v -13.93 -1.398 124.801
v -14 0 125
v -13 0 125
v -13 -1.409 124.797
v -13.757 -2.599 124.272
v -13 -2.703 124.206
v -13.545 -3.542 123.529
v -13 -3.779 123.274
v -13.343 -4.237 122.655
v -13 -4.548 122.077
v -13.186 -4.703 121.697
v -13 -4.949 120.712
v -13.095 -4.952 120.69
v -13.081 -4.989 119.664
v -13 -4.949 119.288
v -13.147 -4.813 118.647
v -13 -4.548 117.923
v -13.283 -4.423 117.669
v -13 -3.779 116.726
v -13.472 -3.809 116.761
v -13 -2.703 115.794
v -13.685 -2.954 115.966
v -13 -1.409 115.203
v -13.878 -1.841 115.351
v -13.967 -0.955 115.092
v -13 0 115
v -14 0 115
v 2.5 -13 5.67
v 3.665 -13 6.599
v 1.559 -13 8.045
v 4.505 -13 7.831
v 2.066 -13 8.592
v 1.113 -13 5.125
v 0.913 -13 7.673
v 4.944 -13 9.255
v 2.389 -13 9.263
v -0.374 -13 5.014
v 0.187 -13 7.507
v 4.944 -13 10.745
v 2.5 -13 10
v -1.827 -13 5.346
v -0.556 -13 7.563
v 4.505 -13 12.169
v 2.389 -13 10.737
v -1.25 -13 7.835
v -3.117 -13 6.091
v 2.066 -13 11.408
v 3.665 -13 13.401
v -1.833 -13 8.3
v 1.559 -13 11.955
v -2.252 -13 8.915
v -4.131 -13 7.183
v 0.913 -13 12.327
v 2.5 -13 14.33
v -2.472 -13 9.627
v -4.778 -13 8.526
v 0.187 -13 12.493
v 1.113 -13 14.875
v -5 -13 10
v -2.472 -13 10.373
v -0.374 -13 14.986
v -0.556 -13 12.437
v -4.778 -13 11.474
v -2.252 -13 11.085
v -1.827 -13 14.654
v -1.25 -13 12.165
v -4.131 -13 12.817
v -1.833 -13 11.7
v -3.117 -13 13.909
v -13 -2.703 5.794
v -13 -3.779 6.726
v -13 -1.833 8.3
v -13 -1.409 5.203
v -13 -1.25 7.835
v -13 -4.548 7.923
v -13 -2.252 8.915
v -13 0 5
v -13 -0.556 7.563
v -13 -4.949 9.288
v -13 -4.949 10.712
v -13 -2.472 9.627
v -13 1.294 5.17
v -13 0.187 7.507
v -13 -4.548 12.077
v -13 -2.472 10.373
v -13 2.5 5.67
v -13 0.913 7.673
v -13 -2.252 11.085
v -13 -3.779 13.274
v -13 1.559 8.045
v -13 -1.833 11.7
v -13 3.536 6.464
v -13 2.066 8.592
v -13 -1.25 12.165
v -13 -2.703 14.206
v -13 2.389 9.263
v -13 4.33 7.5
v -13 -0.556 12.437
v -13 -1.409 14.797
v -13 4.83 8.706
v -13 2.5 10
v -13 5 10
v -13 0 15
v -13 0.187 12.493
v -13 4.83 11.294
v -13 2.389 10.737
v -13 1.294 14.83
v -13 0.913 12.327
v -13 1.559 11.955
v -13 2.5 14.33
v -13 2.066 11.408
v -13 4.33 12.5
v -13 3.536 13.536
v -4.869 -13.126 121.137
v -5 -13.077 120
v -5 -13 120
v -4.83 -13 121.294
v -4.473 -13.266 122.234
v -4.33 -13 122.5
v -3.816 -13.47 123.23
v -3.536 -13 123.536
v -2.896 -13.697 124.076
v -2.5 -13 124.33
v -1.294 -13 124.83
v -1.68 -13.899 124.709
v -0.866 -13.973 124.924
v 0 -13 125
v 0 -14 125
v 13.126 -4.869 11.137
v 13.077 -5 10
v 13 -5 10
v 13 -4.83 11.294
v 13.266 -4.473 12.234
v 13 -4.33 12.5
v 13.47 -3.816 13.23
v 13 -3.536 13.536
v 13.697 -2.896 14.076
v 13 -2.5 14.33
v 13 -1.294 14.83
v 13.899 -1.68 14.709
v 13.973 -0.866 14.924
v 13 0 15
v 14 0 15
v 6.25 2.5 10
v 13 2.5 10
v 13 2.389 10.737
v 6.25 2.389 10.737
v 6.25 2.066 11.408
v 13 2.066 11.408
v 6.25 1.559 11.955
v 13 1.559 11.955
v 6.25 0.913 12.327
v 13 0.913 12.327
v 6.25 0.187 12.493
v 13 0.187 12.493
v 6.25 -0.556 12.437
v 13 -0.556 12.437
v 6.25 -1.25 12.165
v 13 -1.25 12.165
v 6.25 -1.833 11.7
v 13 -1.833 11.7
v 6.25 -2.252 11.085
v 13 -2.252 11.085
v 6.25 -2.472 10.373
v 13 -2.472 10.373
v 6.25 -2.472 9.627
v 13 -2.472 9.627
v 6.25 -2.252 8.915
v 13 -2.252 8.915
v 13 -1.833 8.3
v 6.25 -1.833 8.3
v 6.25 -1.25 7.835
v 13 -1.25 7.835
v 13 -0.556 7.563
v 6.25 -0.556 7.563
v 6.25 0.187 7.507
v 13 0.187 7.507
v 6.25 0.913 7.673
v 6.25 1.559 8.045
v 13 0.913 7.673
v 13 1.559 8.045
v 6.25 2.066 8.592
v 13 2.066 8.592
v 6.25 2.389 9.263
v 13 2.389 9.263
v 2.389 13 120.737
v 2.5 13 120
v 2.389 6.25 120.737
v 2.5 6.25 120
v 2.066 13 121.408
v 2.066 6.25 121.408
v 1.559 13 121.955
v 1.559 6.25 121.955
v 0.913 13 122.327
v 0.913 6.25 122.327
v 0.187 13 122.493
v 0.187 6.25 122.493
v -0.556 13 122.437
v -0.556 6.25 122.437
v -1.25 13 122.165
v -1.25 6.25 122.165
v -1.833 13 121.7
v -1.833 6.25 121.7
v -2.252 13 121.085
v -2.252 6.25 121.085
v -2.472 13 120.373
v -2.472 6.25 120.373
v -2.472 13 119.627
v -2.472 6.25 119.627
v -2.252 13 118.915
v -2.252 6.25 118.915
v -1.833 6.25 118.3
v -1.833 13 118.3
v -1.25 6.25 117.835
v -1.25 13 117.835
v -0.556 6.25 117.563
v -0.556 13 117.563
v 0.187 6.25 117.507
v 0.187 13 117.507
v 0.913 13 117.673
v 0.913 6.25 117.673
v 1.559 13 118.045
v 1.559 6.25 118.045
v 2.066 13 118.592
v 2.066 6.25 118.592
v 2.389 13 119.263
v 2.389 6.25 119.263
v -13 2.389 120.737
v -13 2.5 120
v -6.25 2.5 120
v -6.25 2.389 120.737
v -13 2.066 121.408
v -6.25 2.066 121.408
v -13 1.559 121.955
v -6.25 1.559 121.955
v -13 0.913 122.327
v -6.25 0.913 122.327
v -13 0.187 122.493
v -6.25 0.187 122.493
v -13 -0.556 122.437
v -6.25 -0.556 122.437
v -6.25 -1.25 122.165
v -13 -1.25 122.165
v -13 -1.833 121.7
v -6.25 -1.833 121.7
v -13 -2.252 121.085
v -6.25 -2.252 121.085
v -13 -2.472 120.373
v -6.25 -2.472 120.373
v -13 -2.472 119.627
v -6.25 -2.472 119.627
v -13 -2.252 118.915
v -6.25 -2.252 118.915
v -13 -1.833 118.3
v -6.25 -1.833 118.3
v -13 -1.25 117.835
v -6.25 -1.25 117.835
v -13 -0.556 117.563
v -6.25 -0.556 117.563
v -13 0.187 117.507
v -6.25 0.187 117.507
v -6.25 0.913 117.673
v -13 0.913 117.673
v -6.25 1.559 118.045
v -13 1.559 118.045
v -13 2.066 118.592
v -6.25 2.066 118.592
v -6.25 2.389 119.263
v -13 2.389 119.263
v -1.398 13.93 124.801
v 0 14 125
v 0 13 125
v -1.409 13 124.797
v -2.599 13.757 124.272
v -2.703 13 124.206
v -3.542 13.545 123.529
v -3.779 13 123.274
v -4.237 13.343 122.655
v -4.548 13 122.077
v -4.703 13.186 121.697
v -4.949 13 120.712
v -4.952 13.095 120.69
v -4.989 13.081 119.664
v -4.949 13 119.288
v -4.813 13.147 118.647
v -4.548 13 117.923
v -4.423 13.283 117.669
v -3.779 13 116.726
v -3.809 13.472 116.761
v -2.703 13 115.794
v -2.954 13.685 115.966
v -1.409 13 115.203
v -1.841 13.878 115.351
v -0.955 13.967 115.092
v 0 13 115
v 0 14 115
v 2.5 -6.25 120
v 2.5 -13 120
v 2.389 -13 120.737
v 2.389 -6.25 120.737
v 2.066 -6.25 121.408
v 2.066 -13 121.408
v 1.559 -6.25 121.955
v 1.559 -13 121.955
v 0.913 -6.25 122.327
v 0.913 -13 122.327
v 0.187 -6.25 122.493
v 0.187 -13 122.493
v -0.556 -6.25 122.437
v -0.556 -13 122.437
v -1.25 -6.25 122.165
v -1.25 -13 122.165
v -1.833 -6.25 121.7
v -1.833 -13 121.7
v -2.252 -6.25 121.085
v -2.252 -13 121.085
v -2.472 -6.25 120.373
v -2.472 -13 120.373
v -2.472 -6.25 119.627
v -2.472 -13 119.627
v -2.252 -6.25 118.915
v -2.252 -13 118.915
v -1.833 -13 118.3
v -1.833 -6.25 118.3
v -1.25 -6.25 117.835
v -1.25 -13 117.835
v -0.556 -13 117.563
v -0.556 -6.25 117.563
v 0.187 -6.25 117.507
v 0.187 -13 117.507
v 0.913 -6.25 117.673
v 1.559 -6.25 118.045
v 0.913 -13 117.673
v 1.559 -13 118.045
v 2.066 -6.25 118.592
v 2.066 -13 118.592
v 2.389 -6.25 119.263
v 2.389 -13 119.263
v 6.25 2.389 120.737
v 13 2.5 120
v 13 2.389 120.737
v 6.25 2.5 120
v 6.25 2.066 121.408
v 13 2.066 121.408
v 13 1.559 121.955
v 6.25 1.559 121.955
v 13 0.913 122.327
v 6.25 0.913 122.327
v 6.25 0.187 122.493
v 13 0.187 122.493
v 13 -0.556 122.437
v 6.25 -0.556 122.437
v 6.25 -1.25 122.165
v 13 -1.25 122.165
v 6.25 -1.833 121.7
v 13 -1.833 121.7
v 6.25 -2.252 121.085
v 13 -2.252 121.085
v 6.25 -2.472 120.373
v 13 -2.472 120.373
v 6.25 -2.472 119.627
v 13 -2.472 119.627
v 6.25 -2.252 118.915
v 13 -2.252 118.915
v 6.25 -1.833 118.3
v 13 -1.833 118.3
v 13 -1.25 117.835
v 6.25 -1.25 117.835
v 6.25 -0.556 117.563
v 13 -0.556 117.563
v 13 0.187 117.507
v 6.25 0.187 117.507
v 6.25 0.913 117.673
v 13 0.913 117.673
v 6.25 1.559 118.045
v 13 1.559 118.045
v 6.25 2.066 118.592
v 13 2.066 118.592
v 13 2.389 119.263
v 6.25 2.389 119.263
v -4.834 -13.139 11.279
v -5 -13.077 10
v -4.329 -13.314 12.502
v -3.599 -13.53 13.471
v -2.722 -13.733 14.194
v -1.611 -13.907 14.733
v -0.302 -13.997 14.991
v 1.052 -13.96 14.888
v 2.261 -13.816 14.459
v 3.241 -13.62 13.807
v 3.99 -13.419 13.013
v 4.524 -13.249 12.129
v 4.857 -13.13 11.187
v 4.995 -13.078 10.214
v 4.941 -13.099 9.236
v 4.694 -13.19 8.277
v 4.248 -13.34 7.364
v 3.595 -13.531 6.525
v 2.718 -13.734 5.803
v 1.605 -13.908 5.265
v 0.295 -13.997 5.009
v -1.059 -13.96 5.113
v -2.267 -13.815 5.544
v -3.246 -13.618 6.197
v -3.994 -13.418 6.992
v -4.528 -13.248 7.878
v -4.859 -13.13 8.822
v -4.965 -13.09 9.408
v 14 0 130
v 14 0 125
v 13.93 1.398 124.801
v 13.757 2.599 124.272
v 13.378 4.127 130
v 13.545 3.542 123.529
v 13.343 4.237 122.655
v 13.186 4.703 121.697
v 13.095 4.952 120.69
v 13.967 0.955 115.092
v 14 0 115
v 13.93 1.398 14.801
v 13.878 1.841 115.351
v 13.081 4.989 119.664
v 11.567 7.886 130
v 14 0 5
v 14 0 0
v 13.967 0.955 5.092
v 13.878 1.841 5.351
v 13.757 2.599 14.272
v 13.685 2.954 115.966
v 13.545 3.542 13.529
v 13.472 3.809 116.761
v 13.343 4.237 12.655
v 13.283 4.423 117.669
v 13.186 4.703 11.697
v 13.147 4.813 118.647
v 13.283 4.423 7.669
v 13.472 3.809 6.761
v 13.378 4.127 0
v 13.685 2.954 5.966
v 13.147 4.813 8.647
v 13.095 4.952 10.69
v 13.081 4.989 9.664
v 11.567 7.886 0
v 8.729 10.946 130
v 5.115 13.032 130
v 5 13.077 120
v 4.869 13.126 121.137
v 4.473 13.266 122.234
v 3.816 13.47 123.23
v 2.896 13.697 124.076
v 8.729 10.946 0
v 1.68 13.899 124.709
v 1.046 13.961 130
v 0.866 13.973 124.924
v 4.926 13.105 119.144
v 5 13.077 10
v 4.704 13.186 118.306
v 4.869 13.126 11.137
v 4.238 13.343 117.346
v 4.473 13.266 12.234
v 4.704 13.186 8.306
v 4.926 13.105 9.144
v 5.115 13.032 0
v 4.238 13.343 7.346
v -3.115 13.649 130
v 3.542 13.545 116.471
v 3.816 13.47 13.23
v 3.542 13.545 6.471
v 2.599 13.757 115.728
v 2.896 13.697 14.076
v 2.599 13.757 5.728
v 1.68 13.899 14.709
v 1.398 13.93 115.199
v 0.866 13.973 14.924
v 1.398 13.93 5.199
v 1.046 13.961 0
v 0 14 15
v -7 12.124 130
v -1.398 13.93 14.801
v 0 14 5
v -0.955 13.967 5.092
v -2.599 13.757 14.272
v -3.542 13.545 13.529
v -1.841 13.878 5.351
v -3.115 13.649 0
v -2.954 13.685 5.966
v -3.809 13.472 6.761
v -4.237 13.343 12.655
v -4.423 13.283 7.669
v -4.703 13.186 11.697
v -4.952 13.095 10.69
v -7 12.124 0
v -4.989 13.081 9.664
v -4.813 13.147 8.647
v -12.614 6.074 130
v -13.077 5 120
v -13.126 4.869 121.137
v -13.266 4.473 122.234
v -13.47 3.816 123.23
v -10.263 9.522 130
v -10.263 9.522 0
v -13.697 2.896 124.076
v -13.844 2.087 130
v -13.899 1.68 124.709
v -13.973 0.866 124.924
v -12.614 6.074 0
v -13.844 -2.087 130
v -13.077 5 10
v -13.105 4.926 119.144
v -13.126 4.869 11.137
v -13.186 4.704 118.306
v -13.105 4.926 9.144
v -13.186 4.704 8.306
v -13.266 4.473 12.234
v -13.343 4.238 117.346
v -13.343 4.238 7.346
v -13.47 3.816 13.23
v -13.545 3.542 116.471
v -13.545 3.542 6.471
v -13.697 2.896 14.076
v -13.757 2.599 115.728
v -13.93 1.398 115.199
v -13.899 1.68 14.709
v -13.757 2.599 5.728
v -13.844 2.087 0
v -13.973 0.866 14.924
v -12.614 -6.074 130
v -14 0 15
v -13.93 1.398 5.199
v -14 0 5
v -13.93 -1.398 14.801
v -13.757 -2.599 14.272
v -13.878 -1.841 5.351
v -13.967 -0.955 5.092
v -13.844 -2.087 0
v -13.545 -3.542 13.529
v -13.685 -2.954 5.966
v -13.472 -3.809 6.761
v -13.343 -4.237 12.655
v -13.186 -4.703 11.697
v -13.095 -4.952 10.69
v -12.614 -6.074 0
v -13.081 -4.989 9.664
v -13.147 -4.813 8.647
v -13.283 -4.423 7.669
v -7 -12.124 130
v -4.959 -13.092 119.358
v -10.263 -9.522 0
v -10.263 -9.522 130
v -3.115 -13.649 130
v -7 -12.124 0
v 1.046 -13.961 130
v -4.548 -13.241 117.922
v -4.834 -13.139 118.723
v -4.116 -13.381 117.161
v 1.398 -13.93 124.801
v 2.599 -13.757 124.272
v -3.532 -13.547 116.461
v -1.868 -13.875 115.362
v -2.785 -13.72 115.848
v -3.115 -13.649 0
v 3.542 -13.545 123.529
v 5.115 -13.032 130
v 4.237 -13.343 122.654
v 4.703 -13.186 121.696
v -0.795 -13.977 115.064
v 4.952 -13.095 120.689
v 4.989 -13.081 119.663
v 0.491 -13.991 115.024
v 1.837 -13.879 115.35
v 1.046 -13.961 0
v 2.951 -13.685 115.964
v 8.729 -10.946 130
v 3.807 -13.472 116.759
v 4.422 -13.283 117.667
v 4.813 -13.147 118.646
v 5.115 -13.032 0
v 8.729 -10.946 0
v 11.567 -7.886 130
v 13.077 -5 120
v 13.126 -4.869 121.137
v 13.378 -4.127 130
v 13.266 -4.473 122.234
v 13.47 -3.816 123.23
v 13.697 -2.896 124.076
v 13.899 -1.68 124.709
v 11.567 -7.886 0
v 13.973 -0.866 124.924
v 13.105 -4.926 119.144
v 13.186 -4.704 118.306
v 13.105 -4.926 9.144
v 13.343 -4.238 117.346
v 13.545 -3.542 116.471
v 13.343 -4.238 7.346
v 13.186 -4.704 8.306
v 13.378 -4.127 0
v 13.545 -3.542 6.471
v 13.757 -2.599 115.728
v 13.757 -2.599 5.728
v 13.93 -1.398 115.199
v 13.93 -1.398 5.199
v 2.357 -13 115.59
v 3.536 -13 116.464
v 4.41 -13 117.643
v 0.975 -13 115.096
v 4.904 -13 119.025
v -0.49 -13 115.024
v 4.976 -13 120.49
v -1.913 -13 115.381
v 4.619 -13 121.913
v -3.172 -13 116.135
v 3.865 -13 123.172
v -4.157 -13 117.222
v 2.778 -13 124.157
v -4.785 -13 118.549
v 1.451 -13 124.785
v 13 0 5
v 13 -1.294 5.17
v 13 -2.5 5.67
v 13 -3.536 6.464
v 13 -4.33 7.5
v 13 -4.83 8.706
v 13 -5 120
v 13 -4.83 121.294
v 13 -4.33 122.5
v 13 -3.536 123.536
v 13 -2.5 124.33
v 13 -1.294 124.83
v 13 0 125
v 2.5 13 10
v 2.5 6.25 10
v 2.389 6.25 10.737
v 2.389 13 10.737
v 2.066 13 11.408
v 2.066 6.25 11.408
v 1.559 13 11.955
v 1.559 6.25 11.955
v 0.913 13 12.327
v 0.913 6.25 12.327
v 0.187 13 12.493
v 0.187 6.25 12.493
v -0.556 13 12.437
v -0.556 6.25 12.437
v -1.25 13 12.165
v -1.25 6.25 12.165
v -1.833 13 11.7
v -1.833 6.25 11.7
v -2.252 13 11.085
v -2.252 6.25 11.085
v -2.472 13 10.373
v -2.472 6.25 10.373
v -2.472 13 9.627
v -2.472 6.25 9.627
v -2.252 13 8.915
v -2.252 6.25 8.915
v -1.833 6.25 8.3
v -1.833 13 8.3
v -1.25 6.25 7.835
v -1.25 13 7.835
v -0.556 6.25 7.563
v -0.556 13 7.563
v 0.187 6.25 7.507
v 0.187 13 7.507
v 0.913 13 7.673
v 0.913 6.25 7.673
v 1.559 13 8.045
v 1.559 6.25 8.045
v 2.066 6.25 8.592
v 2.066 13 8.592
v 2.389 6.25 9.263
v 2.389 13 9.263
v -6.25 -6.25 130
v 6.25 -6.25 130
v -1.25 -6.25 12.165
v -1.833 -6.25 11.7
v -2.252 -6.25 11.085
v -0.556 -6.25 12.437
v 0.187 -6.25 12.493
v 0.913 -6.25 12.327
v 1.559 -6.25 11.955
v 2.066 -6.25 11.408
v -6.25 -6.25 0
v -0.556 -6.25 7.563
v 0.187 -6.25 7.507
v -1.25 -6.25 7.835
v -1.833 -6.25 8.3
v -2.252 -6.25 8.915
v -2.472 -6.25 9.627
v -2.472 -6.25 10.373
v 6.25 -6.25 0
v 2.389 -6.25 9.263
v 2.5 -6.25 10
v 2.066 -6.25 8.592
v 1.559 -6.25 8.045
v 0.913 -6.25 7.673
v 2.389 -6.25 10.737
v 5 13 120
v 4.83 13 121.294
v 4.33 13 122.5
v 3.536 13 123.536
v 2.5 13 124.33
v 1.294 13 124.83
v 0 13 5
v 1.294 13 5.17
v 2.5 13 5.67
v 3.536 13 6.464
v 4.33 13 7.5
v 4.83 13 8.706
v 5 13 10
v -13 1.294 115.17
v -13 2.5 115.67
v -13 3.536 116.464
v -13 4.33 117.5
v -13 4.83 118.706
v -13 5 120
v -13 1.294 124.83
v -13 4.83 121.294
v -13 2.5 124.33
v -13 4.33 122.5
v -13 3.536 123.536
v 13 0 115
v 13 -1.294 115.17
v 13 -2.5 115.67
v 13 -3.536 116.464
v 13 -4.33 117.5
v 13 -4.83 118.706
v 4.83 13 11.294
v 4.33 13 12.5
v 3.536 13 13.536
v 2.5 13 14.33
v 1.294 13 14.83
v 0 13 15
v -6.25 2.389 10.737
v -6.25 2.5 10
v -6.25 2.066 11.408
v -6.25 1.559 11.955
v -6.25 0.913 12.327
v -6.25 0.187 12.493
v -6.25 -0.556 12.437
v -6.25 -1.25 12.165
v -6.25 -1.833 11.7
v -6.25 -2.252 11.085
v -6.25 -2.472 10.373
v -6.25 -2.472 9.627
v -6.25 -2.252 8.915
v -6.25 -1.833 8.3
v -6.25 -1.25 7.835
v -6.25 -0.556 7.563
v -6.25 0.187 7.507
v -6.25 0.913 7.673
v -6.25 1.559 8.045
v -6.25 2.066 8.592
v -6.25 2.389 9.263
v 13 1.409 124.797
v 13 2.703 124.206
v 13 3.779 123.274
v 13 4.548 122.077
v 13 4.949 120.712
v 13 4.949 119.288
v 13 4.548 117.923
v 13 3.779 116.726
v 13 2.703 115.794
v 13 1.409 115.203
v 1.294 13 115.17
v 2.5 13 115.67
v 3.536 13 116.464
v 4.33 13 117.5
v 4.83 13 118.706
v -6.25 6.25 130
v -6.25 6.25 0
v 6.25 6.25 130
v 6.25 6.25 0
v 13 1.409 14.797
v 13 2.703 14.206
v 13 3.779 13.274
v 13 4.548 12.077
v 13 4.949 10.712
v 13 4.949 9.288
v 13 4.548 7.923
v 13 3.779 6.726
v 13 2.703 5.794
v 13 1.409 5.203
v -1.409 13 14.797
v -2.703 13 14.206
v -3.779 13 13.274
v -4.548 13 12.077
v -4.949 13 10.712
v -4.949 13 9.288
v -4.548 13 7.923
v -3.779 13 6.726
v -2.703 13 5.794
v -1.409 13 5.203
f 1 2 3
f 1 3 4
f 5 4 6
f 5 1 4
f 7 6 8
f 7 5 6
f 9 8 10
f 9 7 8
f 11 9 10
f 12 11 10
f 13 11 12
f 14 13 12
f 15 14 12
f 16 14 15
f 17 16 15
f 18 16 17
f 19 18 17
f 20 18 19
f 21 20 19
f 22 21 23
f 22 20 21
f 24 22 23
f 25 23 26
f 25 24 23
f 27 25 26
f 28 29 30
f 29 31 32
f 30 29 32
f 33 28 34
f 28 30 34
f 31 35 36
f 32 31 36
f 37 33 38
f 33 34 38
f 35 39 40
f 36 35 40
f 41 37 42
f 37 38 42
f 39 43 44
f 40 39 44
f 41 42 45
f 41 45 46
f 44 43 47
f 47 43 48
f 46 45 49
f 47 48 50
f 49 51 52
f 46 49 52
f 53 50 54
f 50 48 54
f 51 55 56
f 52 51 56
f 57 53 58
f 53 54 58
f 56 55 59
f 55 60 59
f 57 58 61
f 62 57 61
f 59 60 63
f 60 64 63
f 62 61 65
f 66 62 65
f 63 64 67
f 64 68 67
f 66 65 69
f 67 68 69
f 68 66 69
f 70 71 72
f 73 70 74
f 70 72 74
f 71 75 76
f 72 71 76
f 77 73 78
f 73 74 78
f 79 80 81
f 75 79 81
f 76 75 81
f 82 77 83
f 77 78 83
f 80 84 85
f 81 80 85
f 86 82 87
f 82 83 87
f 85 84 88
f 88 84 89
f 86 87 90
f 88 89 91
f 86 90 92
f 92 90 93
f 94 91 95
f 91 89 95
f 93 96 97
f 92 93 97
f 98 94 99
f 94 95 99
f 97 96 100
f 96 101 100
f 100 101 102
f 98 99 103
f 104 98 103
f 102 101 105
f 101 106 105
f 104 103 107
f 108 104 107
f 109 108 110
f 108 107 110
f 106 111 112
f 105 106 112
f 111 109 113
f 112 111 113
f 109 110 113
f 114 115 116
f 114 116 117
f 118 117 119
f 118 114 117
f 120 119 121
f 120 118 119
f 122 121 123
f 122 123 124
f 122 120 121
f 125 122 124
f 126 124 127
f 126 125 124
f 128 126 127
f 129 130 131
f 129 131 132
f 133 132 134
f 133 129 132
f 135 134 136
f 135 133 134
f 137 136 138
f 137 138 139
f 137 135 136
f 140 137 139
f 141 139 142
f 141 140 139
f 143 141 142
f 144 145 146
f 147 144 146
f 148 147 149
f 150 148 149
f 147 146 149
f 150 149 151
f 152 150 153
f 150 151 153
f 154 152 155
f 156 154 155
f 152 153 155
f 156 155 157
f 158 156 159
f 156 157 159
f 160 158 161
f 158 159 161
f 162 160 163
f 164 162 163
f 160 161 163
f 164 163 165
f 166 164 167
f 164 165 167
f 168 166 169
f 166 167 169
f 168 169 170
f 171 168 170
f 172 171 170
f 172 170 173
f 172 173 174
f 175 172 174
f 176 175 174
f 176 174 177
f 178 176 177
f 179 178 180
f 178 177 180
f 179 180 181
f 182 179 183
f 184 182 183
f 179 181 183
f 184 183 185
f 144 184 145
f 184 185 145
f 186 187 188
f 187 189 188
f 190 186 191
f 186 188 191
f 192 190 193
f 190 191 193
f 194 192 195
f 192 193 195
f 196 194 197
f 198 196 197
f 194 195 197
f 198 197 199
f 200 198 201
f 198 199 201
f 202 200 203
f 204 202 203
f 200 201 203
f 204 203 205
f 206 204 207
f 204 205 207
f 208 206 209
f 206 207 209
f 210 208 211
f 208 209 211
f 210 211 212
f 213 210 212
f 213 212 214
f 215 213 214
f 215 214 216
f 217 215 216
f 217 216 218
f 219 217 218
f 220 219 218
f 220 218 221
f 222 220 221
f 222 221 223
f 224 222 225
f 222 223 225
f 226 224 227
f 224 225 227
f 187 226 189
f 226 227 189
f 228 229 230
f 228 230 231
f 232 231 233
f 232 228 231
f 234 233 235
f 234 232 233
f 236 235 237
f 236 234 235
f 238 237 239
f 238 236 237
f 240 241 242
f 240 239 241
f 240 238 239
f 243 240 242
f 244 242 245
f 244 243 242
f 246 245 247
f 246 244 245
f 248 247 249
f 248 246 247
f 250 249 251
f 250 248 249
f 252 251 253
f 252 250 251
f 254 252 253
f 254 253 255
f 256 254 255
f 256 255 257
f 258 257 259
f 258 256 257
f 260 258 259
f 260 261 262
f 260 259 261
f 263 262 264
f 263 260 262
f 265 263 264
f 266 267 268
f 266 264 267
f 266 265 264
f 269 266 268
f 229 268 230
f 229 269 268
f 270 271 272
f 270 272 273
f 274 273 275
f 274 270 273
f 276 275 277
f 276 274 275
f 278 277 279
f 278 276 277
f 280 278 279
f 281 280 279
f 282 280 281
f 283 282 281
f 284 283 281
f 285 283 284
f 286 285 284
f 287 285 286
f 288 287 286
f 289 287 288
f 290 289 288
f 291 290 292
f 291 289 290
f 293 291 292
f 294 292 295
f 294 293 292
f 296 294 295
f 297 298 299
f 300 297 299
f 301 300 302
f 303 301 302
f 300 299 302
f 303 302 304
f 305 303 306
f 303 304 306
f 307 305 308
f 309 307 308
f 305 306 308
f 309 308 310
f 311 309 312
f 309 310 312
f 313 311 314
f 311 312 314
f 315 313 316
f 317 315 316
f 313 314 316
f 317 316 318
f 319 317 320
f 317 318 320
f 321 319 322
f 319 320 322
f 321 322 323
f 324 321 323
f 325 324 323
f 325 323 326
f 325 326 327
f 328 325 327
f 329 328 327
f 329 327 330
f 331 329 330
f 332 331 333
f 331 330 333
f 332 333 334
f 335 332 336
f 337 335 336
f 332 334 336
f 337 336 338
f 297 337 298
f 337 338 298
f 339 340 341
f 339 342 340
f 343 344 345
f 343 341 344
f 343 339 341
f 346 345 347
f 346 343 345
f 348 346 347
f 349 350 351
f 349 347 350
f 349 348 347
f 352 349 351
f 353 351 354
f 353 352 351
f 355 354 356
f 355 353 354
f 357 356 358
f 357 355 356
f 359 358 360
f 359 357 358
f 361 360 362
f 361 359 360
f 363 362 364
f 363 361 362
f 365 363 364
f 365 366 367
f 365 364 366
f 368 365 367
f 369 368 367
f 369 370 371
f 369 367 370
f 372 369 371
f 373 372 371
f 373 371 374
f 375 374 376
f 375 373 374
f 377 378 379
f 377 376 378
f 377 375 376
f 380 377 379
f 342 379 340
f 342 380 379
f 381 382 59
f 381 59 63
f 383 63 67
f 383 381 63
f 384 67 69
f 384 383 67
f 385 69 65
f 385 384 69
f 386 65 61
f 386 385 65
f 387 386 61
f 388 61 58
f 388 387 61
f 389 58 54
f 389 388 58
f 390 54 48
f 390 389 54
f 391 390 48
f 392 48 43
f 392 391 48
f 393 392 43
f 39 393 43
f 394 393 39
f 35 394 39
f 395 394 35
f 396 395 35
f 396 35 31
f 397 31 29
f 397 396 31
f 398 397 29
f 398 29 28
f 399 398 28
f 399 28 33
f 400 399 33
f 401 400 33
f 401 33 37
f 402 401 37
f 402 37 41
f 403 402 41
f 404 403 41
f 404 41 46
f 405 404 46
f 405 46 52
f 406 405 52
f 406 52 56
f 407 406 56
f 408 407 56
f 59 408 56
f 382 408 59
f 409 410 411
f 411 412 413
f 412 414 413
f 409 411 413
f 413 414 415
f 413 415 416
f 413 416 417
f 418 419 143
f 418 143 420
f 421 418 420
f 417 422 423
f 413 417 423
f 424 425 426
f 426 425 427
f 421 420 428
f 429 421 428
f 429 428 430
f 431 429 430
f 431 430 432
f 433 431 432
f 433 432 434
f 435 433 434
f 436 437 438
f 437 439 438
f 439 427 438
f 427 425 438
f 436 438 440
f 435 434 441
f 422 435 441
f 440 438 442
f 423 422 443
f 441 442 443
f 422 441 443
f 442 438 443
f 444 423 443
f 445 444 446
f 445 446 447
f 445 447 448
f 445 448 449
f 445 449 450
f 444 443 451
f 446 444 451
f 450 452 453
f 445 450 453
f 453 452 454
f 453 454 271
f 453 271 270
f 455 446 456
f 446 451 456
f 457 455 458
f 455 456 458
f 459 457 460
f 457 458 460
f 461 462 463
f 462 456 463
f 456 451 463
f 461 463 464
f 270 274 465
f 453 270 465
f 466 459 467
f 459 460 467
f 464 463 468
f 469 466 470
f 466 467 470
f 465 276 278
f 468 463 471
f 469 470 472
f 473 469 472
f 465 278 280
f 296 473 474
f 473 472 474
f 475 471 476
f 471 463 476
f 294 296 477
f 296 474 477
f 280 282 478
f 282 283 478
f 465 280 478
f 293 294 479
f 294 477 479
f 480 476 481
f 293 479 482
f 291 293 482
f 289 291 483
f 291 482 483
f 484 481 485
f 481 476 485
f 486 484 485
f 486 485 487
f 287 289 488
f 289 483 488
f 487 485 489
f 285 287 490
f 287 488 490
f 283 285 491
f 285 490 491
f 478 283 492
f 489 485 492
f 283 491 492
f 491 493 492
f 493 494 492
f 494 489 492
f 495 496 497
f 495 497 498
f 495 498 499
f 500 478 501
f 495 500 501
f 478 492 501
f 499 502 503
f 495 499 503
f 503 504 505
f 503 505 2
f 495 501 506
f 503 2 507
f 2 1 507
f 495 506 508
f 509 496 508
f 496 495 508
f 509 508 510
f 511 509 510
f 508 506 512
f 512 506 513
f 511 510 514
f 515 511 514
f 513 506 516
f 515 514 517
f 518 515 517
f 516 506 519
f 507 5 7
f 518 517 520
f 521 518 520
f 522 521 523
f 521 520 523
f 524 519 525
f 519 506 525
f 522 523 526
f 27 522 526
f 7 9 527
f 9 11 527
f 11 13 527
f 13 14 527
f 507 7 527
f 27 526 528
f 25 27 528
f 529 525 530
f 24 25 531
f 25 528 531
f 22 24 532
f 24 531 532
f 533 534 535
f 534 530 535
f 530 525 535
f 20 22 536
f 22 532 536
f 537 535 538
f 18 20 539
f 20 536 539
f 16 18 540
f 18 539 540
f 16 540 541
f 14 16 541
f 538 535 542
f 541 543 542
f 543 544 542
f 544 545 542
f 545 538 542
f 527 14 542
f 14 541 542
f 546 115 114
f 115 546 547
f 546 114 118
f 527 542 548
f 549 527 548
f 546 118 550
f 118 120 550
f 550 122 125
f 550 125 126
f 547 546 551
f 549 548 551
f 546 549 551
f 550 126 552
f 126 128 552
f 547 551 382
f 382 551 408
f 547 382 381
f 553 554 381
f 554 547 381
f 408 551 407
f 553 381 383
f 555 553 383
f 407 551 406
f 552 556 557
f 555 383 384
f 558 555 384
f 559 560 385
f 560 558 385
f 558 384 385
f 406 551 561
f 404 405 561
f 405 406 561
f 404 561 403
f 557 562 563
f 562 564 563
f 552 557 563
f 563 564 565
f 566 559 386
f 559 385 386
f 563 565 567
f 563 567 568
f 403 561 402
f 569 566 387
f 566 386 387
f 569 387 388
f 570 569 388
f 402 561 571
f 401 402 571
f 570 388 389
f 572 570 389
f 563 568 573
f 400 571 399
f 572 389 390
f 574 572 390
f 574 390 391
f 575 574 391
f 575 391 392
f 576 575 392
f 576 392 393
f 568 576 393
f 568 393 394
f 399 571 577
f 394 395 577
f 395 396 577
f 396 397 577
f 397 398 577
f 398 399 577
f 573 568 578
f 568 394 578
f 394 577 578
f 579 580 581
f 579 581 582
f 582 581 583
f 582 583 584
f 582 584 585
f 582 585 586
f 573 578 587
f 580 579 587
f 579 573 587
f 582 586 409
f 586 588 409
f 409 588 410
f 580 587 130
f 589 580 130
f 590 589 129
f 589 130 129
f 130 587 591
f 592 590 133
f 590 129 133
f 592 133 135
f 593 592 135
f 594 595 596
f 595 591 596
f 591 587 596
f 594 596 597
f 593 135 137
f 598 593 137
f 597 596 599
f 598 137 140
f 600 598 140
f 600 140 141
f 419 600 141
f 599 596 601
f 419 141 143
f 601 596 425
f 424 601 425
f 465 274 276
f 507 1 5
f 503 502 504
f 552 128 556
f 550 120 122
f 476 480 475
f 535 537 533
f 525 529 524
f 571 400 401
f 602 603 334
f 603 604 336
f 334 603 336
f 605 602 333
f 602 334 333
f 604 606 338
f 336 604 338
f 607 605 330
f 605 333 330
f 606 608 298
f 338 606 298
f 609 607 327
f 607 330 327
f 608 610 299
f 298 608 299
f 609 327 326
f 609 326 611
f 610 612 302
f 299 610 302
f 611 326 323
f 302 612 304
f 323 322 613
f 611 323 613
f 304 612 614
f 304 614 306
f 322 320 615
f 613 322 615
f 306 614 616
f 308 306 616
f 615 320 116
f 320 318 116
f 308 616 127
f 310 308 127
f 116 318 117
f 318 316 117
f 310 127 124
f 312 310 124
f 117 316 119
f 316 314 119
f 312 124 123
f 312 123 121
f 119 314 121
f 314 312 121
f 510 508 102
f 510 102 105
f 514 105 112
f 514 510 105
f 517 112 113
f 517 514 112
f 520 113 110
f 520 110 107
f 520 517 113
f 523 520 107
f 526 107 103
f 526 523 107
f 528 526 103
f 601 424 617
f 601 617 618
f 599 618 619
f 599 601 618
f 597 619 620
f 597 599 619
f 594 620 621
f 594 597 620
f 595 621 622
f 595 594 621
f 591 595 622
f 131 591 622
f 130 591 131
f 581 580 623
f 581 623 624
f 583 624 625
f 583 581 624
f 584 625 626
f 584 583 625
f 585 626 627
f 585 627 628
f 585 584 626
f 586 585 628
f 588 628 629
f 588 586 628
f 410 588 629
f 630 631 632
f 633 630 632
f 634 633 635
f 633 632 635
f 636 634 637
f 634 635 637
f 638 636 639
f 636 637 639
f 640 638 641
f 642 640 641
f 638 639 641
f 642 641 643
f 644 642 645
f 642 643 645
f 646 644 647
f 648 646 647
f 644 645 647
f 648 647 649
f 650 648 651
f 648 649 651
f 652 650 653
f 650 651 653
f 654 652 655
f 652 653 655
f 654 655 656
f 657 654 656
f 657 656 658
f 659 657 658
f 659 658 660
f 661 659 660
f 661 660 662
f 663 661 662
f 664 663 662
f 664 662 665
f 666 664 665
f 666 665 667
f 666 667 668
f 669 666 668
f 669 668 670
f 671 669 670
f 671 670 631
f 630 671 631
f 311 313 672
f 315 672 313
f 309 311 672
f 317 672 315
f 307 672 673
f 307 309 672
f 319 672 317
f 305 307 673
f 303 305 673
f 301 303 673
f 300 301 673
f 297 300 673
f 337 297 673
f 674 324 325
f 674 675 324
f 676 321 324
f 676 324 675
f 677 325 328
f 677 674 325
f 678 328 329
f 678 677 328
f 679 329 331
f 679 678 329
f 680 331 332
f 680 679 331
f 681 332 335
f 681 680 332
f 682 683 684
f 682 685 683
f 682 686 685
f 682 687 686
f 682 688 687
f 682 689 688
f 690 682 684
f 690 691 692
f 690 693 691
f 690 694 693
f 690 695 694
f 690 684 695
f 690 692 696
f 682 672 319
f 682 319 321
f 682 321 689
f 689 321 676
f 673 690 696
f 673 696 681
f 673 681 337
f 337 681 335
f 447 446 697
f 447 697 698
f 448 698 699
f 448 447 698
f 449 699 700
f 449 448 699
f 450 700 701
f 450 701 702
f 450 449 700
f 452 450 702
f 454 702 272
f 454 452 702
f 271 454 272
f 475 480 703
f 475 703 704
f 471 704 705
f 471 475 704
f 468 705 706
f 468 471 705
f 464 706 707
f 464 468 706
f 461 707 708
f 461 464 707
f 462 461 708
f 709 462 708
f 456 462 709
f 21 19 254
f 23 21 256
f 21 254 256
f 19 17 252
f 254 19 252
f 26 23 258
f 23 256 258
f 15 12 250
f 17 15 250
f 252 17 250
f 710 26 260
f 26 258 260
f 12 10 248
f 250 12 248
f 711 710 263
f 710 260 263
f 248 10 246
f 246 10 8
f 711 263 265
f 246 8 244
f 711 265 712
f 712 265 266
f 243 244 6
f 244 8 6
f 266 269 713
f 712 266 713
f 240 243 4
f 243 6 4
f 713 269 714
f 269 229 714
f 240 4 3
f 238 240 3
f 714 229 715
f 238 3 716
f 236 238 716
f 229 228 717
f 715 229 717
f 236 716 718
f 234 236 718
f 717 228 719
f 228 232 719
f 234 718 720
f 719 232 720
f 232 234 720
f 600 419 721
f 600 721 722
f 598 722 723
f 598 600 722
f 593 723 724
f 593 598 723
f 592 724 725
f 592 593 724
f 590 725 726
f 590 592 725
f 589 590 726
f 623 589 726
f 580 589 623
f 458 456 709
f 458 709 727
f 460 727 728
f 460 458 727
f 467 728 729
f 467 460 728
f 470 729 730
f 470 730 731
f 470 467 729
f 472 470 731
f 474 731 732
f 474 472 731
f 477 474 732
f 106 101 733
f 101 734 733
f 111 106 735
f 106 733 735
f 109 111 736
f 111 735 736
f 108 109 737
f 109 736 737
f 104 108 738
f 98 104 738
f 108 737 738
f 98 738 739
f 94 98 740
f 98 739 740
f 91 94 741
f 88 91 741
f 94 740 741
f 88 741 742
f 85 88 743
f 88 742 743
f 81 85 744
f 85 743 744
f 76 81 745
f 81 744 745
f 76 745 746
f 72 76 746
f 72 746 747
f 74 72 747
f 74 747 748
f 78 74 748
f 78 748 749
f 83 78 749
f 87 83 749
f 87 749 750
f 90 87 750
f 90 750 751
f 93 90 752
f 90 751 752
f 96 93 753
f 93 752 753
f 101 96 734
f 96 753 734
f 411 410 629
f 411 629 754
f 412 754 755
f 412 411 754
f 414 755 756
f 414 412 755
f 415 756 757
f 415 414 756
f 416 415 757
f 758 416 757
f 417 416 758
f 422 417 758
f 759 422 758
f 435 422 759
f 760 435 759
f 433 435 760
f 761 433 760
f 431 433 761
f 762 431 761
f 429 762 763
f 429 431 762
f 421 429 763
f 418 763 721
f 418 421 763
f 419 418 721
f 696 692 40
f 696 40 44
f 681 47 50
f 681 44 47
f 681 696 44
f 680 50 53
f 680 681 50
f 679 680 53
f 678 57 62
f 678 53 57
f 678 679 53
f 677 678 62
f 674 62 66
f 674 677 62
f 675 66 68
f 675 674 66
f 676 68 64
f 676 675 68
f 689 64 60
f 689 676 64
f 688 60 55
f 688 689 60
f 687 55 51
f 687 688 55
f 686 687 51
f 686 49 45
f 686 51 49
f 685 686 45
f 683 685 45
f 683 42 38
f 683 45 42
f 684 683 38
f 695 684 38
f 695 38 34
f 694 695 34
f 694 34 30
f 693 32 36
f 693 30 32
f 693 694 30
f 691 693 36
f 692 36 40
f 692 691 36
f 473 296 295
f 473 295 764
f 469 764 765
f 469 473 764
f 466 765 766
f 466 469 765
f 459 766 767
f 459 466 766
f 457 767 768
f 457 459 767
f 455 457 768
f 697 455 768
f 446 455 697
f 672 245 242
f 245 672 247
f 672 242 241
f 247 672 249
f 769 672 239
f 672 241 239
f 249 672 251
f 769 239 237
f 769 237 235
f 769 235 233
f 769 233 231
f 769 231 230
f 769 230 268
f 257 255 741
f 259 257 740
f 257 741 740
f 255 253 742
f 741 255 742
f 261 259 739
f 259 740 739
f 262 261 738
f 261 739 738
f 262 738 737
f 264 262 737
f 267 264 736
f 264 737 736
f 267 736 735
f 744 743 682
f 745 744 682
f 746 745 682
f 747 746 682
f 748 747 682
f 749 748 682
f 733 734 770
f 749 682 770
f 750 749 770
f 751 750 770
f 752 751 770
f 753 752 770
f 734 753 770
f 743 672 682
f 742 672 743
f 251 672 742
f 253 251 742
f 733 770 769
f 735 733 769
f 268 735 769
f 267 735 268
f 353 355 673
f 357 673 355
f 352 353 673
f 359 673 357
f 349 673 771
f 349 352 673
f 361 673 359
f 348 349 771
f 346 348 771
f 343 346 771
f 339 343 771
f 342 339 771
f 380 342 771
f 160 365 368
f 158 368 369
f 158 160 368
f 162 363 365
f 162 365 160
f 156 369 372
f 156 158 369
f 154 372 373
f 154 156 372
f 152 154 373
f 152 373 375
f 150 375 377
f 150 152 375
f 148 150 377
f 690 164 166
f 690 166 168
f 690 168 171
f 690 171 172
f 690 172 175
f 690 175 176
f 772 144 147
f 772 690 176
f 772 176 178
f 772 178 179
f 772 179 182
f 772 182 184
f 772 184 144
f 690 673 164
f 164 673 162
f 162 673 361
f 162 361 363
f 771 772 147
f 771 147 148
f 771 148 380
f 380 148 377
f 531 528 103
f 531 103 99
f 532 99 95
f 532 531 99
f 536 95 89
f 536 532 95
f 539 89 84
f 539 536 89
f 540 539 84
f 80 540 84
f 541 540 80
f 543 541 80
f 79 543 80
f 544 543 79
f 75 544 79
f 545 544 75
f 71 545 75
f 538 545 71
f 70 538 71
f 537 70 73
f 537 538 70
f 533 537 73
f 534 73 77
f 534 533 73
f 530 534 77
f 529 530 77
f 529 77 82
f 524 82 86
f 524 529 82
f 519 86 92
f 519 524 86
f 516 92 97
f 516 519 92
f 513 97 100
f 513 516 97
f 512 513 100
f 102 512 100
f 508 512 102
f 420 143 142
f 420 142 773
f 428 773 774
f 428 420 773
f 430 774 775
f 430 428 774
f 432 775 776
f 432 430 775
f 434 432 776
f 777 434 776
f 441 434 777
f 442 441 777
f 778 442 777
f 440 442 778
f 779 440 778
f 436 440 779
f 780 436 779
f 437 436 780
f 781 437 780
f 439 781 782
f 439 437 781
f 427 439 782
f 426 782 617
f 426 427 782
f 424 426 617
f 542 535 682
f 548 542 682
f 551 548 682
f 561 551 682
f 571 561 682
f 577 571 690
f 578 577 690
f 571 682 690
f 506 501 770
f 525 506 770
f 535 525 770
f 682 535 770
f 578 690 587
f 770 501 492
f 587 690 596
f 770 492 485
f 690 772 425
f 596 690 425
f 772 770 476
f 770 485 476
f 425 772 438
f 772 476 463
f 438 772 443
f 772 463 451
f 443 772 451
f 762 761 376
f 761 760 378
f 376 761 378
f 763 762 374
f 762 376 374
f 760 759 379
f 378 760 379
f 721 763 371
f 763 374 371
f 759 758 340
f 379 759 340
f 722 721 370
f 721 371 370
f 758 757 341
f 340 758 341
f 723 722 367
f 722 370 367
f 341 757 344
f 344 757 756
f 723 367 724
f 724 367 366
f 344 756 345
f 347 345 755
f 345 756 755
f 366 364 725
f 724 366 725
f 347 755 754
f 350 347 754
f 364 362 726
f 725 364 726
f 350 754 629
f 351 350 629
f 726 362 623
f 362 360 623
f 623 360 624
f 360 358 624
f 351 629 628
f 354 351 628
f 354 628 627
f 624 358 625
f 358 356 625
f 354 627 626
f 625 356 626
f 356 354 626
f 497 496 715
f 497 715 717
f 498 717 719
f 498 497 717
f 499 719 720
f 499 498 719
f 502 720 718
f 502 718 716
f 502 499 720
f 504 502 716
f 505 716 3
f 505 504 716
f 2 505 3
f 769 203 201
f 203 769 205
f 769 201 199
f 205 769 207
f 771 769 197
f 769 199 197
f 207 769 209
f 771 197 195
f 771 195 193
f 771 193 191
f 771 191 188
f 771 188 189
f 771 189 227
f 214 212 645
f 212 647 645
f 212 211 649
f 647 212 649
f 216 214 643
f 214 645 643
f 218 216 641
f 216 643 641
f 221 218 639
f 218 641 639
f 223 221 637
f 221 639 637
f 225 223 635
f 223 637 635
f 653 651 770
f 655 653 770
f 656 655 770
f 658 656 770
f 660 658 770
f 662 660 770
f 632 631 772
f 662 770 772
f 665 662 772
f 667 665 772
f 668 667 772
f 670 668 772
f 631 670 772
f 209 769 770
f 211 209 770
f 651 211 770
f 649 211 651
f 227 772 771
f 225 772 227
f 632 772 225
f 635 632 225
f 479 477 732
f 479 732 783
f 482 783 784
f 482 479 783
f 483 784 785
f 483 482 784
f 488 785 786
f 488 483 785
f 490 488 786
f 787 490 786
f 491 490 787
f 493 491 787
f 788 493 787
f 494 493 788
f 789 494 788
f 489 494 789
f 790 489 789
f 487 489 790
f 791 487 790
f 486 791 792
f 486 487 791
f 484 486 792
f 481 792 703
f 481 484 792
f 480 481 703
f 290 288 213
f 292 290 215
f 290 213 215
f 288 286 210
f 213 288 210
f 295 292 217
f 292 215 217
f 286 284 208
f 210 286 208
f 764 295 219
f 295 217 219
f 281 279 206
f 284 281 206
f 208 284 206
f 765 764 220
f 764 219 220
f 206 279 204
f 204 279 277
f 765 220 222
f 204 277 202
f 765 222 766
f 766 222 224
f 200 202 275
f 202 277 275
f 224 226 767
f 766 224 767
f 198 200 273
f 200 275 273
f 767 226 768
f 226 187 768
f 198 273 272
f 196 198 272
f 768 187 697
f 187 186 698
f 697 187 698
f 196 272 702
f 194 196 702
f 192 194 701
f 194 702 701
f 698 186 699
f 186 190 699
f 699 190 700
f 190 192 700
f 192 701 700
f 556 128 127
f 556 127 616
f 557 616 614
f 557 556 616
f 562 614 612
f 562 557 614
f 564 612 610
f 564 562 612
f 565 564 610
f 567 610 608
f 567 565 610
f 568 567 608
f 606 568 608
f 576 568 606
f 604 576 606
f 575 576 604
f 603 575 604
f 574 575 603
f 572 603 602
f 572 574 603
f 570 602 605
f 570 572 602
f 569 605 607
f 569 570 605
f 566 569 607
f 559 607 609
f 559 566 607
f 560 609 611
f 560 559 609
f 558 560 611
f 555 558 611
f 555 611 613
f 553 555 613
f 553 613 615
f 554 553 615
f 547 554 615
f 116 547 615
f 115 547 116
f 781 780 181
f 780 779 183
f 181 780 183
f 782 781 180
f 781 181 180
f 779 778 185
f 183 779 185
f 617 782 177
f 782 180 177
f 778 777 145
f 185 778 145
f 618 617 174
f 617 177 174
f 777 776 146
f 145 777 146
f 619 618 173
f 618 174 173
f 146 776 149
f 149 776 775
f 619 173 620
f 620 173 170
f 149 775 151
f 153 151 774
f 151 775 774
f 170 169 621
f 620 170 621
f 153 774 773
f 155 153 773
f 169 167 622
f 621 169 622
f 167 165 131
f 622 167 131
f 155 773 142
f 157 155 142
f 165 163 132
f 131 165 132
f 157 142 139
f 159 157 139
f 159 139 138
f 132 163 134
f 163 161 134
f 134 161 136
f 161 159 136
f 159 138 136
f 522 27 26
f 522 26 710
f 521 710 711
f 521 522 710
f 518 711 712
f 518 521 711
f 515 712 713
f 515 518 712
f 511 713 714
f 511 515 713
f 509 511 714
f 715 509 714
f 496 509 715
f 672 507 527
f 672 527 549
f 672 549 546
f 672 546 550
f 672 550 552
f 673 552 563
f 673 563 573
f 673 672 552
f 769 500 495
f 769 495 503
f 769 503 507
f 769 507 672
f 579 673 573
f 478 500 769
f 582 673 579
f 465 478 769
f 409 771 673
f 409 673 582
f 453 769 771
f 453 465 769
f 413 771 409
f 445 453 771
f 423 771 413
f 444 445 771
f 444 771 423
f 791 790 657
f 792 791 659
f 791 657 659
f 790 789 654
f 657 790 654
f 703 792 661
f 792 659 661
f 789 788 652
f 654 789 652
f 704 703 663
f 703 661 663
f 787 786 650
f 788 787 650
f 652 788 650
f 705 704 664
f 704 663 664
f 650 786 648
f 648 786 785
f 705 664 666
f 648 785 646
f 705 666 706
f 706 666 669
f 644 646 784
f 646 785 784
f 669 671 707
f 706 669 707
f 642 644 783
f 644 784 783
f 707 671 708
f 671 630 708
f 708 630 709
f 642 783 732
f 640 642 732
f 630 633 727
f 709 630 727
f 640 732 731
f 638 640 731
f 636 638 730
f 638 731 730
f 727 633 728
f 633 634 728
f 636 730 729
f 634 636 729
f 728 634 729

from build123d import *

# Parameters (mm, degrees)
F0_R            = 14
F0_W            = 12.5
F0_H            = 12.5
F1_DEPTH        = 130
F2_R            = 2.5
F4_DEPTH        = 25
F3_R            = 2.5
F5_DEPTH        = 25
F9_DEPTH        = 1
F9_COPIES_COUNT = 3
F9_COPIES_ANGLE = 180
F12_R           = 5
F13_DEPTH       = 1


# Not quite as in the source:
# - a pattern or mirror of a feature is missing from the dataset's text; its kind, count and spacing are read off the source's solid


with BuildPart() as f1:
    # F0 (on Top) → F1 (new body)
    with BuildSketch(Plane.XY):
        Circle(F0_R)
        Rectangle(F0_W, F0_H, mode=Mode.SUBTRACT)
    extrude(amount=F1_DEPTH)

    # F2 (on face) → F4 (cut, symmetric)
    with BuildSketch(Plane.XZ.offset(-6.25)):
        with Locations((0, 10)):
            Circle(F2_R)
        with Locations((0, 120)):
            Circle(F2_R)
    extrude(amount=F4_DEPTH, both=True, mode=Mode.SUBTRACT)

    # F3 (on face) → F5 (cut, symmetric)
    with BuildSketch(Plane.YZ.offset(-6.25)):
        with BuildLine():
            ThreePointArc((2.5, 120), (1.767766953, 121.767766953), (0, 122.5))
            ThreePointArc((0, 122.5), (-1.767766953, 118.232233047), (2.5, 120))
        make_face()
        with Locations((0, 10)):
            Circle(F3_R)
    extrude(amount=F5_DEPTH, both=True, mode=Mode.SUBTRACT)

    # F8 (on line) → F9 (cut)
    with BuildSketch(Plane(origin=(14, 0, 0), x_dir=(0, -1, 0), z_dir=(-1, 0, 0))):
        with BuildLine():
            ThreePointArc((5, 120), (3.5355339059, 123.5355339059), (0, 125))
            Line((0, 125), (0, 115))
            ThreePointArc((0, 115), (3.5355339059, 116.4644660941), (5, 120))
        make_face()
        with BuildLine():
            ThreePointArc((5, 10), (3.5355339059, 13.5355339059), (0, 15))
            Line((0, 15), (0, 5))
            ThreePointArc((0, 5), (3.5355339059, 6.4644660941), (5, 10))
        make_face()
        with BuildLine():
            Line((0, 5), (0, 15))
            ThreePointArc((0, 15), (-5, 10), (0, 5))
        make_face()
        with BuildLine():
            Line((0, 115), (0, 125))
            ThreePointArc((0, 125), (-5, 120), (0, 115))
        make_face()
    f9 = extrude(amount=F9_DEPTH, mode=Mode.SUBTRACT)

    # F9_copies: F9 ×3 about axis
    f9_copies_axis = Axis((0, 0, 0), (0, 0, 1))
    for i in range(1, F9_COPIES_COUNT):
        add(f9.rotate(f9_copies_axis, i * F9_COPIES_ANGLE / (F9_COPIES_COUNT - 1)), mode=Mode.SUBTRACT)

    # F12 (on line) → F13 (cut)
    with BuildSketch(Plane(origin=(0, -14, 0), x_dir=(-1, 0, 0), z_dir=(0, 1, 0))):
        with BuildLine():
            ThreePointArc((0, 125), (-3.5355339059, 116.4644660941), (5, 120))
            ThreePointArc((5, 120), (3.5355339059, 123.5355339059), (0, 125))
        make_face()
        with Locations((0, 10)):
            Circle(F12_R)
    extrude(amount=F13_DEPTH, mode=Mode.SUBTRACT)


solid = f1.part
